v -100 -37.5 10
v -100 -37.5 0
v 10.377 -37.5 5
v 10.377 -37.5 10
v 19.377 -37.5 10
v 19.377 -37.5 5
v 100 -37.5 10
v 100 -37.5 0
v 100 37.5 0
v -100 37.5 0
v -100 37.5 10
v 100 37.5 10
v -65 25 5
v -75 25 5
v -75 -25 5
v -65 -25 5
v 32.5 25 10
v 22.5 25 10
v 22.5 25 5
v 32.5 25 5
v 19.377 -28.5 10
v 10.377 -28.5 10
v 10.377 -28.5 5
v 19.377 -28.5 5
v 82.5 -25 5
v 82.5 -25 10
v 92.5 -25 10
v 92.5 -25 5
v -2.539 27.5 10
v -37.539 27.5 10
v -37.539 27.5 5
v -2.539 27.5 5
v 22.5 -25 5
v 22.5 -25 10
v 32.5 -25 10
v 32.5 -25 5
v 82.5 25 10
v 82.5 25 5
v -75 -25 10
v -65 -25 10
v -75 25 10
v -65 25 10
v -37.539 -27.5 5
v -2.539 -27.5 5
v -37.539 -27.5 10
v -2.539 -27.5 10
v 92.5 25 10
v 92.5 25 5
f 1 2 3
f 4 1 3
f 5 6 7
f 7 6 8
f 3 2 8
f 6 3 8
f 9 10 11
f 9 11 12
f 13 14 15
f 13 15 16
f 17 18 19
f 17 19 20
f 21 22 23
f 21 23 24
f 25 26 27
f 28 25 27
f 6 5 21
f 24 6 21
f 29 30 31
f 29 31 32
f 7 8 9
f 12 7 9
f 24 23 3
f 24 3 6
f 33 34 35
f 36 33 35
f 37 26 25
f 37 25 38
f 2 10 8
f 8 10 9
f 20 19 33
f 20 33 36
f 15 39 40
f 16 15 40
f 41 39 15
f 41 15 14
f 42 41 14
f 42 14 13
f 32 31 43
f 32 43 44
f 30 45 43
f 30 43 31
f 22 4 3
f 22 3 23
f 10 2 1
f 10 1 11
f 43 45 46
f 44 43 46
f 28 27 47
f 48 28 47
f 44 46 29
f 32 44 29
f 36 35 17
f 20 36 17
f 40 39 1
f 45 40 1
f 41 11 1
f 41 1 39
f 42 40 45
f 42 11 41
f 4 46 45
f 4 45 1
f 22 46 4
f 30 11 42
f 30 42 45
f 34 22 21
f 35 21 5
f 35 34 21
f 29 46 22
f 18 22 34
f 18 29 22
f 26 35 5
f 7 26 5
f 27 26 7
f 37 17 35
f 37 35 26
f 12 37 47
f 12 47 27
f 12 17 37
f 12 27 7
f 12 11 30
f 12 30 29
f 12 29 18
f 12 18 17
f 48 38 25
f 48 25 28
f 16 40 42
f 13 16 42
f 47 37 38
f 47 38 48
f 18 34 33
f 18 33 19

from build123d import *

# Parameters (mm, degrees)
F0_W     = 200
F0_H     = 75
F1_DEPTH = 10
F2_W     = 10
F2_H     = 50
F3_DEPTH = 5
F4_W     = 35
F4_H     = 55
F4_W_2   = 9
F4_H_2   = 9
F5_DEPTH = 5


with BuildPart() as f1:
    # F0 (on Top) → F1 (new body)
    with BuildSketch(Plane.XY):
        Rectangle(F0_W, F0_H)
    extrude(amount=F1_DEPTH)

    # F2 (on face) → F3 (cut)
    with BuildSketch(Plane.XY.offset(10)):
        with Locations((-70, 0)):
            Rectangle(F2_W, F2_H)
        with Locations((27.5, 0)):
            Rectangle(F2_W, F2_H)
        with Locations((87.5, 0)):
            Rectangle(F2_W, F2_H)
    extrude(amount=-F3_DEPTH, mode=Mode.SUBTRACT)

    # F4 (on face) → F5 (cut)
    with BuildSketch(Plane.XY.offset(10)):
        with Locations((-20.039216, 0)):
            Rectangle(F4_W, F4_H)
        with Locations((14.87713, -33)):
            Rectangle(F4_W_2, F4_H_2)
    extrude(amount=-F5_DEPTH, mode=Mode.SUBTRACT)


solid = f1.part
